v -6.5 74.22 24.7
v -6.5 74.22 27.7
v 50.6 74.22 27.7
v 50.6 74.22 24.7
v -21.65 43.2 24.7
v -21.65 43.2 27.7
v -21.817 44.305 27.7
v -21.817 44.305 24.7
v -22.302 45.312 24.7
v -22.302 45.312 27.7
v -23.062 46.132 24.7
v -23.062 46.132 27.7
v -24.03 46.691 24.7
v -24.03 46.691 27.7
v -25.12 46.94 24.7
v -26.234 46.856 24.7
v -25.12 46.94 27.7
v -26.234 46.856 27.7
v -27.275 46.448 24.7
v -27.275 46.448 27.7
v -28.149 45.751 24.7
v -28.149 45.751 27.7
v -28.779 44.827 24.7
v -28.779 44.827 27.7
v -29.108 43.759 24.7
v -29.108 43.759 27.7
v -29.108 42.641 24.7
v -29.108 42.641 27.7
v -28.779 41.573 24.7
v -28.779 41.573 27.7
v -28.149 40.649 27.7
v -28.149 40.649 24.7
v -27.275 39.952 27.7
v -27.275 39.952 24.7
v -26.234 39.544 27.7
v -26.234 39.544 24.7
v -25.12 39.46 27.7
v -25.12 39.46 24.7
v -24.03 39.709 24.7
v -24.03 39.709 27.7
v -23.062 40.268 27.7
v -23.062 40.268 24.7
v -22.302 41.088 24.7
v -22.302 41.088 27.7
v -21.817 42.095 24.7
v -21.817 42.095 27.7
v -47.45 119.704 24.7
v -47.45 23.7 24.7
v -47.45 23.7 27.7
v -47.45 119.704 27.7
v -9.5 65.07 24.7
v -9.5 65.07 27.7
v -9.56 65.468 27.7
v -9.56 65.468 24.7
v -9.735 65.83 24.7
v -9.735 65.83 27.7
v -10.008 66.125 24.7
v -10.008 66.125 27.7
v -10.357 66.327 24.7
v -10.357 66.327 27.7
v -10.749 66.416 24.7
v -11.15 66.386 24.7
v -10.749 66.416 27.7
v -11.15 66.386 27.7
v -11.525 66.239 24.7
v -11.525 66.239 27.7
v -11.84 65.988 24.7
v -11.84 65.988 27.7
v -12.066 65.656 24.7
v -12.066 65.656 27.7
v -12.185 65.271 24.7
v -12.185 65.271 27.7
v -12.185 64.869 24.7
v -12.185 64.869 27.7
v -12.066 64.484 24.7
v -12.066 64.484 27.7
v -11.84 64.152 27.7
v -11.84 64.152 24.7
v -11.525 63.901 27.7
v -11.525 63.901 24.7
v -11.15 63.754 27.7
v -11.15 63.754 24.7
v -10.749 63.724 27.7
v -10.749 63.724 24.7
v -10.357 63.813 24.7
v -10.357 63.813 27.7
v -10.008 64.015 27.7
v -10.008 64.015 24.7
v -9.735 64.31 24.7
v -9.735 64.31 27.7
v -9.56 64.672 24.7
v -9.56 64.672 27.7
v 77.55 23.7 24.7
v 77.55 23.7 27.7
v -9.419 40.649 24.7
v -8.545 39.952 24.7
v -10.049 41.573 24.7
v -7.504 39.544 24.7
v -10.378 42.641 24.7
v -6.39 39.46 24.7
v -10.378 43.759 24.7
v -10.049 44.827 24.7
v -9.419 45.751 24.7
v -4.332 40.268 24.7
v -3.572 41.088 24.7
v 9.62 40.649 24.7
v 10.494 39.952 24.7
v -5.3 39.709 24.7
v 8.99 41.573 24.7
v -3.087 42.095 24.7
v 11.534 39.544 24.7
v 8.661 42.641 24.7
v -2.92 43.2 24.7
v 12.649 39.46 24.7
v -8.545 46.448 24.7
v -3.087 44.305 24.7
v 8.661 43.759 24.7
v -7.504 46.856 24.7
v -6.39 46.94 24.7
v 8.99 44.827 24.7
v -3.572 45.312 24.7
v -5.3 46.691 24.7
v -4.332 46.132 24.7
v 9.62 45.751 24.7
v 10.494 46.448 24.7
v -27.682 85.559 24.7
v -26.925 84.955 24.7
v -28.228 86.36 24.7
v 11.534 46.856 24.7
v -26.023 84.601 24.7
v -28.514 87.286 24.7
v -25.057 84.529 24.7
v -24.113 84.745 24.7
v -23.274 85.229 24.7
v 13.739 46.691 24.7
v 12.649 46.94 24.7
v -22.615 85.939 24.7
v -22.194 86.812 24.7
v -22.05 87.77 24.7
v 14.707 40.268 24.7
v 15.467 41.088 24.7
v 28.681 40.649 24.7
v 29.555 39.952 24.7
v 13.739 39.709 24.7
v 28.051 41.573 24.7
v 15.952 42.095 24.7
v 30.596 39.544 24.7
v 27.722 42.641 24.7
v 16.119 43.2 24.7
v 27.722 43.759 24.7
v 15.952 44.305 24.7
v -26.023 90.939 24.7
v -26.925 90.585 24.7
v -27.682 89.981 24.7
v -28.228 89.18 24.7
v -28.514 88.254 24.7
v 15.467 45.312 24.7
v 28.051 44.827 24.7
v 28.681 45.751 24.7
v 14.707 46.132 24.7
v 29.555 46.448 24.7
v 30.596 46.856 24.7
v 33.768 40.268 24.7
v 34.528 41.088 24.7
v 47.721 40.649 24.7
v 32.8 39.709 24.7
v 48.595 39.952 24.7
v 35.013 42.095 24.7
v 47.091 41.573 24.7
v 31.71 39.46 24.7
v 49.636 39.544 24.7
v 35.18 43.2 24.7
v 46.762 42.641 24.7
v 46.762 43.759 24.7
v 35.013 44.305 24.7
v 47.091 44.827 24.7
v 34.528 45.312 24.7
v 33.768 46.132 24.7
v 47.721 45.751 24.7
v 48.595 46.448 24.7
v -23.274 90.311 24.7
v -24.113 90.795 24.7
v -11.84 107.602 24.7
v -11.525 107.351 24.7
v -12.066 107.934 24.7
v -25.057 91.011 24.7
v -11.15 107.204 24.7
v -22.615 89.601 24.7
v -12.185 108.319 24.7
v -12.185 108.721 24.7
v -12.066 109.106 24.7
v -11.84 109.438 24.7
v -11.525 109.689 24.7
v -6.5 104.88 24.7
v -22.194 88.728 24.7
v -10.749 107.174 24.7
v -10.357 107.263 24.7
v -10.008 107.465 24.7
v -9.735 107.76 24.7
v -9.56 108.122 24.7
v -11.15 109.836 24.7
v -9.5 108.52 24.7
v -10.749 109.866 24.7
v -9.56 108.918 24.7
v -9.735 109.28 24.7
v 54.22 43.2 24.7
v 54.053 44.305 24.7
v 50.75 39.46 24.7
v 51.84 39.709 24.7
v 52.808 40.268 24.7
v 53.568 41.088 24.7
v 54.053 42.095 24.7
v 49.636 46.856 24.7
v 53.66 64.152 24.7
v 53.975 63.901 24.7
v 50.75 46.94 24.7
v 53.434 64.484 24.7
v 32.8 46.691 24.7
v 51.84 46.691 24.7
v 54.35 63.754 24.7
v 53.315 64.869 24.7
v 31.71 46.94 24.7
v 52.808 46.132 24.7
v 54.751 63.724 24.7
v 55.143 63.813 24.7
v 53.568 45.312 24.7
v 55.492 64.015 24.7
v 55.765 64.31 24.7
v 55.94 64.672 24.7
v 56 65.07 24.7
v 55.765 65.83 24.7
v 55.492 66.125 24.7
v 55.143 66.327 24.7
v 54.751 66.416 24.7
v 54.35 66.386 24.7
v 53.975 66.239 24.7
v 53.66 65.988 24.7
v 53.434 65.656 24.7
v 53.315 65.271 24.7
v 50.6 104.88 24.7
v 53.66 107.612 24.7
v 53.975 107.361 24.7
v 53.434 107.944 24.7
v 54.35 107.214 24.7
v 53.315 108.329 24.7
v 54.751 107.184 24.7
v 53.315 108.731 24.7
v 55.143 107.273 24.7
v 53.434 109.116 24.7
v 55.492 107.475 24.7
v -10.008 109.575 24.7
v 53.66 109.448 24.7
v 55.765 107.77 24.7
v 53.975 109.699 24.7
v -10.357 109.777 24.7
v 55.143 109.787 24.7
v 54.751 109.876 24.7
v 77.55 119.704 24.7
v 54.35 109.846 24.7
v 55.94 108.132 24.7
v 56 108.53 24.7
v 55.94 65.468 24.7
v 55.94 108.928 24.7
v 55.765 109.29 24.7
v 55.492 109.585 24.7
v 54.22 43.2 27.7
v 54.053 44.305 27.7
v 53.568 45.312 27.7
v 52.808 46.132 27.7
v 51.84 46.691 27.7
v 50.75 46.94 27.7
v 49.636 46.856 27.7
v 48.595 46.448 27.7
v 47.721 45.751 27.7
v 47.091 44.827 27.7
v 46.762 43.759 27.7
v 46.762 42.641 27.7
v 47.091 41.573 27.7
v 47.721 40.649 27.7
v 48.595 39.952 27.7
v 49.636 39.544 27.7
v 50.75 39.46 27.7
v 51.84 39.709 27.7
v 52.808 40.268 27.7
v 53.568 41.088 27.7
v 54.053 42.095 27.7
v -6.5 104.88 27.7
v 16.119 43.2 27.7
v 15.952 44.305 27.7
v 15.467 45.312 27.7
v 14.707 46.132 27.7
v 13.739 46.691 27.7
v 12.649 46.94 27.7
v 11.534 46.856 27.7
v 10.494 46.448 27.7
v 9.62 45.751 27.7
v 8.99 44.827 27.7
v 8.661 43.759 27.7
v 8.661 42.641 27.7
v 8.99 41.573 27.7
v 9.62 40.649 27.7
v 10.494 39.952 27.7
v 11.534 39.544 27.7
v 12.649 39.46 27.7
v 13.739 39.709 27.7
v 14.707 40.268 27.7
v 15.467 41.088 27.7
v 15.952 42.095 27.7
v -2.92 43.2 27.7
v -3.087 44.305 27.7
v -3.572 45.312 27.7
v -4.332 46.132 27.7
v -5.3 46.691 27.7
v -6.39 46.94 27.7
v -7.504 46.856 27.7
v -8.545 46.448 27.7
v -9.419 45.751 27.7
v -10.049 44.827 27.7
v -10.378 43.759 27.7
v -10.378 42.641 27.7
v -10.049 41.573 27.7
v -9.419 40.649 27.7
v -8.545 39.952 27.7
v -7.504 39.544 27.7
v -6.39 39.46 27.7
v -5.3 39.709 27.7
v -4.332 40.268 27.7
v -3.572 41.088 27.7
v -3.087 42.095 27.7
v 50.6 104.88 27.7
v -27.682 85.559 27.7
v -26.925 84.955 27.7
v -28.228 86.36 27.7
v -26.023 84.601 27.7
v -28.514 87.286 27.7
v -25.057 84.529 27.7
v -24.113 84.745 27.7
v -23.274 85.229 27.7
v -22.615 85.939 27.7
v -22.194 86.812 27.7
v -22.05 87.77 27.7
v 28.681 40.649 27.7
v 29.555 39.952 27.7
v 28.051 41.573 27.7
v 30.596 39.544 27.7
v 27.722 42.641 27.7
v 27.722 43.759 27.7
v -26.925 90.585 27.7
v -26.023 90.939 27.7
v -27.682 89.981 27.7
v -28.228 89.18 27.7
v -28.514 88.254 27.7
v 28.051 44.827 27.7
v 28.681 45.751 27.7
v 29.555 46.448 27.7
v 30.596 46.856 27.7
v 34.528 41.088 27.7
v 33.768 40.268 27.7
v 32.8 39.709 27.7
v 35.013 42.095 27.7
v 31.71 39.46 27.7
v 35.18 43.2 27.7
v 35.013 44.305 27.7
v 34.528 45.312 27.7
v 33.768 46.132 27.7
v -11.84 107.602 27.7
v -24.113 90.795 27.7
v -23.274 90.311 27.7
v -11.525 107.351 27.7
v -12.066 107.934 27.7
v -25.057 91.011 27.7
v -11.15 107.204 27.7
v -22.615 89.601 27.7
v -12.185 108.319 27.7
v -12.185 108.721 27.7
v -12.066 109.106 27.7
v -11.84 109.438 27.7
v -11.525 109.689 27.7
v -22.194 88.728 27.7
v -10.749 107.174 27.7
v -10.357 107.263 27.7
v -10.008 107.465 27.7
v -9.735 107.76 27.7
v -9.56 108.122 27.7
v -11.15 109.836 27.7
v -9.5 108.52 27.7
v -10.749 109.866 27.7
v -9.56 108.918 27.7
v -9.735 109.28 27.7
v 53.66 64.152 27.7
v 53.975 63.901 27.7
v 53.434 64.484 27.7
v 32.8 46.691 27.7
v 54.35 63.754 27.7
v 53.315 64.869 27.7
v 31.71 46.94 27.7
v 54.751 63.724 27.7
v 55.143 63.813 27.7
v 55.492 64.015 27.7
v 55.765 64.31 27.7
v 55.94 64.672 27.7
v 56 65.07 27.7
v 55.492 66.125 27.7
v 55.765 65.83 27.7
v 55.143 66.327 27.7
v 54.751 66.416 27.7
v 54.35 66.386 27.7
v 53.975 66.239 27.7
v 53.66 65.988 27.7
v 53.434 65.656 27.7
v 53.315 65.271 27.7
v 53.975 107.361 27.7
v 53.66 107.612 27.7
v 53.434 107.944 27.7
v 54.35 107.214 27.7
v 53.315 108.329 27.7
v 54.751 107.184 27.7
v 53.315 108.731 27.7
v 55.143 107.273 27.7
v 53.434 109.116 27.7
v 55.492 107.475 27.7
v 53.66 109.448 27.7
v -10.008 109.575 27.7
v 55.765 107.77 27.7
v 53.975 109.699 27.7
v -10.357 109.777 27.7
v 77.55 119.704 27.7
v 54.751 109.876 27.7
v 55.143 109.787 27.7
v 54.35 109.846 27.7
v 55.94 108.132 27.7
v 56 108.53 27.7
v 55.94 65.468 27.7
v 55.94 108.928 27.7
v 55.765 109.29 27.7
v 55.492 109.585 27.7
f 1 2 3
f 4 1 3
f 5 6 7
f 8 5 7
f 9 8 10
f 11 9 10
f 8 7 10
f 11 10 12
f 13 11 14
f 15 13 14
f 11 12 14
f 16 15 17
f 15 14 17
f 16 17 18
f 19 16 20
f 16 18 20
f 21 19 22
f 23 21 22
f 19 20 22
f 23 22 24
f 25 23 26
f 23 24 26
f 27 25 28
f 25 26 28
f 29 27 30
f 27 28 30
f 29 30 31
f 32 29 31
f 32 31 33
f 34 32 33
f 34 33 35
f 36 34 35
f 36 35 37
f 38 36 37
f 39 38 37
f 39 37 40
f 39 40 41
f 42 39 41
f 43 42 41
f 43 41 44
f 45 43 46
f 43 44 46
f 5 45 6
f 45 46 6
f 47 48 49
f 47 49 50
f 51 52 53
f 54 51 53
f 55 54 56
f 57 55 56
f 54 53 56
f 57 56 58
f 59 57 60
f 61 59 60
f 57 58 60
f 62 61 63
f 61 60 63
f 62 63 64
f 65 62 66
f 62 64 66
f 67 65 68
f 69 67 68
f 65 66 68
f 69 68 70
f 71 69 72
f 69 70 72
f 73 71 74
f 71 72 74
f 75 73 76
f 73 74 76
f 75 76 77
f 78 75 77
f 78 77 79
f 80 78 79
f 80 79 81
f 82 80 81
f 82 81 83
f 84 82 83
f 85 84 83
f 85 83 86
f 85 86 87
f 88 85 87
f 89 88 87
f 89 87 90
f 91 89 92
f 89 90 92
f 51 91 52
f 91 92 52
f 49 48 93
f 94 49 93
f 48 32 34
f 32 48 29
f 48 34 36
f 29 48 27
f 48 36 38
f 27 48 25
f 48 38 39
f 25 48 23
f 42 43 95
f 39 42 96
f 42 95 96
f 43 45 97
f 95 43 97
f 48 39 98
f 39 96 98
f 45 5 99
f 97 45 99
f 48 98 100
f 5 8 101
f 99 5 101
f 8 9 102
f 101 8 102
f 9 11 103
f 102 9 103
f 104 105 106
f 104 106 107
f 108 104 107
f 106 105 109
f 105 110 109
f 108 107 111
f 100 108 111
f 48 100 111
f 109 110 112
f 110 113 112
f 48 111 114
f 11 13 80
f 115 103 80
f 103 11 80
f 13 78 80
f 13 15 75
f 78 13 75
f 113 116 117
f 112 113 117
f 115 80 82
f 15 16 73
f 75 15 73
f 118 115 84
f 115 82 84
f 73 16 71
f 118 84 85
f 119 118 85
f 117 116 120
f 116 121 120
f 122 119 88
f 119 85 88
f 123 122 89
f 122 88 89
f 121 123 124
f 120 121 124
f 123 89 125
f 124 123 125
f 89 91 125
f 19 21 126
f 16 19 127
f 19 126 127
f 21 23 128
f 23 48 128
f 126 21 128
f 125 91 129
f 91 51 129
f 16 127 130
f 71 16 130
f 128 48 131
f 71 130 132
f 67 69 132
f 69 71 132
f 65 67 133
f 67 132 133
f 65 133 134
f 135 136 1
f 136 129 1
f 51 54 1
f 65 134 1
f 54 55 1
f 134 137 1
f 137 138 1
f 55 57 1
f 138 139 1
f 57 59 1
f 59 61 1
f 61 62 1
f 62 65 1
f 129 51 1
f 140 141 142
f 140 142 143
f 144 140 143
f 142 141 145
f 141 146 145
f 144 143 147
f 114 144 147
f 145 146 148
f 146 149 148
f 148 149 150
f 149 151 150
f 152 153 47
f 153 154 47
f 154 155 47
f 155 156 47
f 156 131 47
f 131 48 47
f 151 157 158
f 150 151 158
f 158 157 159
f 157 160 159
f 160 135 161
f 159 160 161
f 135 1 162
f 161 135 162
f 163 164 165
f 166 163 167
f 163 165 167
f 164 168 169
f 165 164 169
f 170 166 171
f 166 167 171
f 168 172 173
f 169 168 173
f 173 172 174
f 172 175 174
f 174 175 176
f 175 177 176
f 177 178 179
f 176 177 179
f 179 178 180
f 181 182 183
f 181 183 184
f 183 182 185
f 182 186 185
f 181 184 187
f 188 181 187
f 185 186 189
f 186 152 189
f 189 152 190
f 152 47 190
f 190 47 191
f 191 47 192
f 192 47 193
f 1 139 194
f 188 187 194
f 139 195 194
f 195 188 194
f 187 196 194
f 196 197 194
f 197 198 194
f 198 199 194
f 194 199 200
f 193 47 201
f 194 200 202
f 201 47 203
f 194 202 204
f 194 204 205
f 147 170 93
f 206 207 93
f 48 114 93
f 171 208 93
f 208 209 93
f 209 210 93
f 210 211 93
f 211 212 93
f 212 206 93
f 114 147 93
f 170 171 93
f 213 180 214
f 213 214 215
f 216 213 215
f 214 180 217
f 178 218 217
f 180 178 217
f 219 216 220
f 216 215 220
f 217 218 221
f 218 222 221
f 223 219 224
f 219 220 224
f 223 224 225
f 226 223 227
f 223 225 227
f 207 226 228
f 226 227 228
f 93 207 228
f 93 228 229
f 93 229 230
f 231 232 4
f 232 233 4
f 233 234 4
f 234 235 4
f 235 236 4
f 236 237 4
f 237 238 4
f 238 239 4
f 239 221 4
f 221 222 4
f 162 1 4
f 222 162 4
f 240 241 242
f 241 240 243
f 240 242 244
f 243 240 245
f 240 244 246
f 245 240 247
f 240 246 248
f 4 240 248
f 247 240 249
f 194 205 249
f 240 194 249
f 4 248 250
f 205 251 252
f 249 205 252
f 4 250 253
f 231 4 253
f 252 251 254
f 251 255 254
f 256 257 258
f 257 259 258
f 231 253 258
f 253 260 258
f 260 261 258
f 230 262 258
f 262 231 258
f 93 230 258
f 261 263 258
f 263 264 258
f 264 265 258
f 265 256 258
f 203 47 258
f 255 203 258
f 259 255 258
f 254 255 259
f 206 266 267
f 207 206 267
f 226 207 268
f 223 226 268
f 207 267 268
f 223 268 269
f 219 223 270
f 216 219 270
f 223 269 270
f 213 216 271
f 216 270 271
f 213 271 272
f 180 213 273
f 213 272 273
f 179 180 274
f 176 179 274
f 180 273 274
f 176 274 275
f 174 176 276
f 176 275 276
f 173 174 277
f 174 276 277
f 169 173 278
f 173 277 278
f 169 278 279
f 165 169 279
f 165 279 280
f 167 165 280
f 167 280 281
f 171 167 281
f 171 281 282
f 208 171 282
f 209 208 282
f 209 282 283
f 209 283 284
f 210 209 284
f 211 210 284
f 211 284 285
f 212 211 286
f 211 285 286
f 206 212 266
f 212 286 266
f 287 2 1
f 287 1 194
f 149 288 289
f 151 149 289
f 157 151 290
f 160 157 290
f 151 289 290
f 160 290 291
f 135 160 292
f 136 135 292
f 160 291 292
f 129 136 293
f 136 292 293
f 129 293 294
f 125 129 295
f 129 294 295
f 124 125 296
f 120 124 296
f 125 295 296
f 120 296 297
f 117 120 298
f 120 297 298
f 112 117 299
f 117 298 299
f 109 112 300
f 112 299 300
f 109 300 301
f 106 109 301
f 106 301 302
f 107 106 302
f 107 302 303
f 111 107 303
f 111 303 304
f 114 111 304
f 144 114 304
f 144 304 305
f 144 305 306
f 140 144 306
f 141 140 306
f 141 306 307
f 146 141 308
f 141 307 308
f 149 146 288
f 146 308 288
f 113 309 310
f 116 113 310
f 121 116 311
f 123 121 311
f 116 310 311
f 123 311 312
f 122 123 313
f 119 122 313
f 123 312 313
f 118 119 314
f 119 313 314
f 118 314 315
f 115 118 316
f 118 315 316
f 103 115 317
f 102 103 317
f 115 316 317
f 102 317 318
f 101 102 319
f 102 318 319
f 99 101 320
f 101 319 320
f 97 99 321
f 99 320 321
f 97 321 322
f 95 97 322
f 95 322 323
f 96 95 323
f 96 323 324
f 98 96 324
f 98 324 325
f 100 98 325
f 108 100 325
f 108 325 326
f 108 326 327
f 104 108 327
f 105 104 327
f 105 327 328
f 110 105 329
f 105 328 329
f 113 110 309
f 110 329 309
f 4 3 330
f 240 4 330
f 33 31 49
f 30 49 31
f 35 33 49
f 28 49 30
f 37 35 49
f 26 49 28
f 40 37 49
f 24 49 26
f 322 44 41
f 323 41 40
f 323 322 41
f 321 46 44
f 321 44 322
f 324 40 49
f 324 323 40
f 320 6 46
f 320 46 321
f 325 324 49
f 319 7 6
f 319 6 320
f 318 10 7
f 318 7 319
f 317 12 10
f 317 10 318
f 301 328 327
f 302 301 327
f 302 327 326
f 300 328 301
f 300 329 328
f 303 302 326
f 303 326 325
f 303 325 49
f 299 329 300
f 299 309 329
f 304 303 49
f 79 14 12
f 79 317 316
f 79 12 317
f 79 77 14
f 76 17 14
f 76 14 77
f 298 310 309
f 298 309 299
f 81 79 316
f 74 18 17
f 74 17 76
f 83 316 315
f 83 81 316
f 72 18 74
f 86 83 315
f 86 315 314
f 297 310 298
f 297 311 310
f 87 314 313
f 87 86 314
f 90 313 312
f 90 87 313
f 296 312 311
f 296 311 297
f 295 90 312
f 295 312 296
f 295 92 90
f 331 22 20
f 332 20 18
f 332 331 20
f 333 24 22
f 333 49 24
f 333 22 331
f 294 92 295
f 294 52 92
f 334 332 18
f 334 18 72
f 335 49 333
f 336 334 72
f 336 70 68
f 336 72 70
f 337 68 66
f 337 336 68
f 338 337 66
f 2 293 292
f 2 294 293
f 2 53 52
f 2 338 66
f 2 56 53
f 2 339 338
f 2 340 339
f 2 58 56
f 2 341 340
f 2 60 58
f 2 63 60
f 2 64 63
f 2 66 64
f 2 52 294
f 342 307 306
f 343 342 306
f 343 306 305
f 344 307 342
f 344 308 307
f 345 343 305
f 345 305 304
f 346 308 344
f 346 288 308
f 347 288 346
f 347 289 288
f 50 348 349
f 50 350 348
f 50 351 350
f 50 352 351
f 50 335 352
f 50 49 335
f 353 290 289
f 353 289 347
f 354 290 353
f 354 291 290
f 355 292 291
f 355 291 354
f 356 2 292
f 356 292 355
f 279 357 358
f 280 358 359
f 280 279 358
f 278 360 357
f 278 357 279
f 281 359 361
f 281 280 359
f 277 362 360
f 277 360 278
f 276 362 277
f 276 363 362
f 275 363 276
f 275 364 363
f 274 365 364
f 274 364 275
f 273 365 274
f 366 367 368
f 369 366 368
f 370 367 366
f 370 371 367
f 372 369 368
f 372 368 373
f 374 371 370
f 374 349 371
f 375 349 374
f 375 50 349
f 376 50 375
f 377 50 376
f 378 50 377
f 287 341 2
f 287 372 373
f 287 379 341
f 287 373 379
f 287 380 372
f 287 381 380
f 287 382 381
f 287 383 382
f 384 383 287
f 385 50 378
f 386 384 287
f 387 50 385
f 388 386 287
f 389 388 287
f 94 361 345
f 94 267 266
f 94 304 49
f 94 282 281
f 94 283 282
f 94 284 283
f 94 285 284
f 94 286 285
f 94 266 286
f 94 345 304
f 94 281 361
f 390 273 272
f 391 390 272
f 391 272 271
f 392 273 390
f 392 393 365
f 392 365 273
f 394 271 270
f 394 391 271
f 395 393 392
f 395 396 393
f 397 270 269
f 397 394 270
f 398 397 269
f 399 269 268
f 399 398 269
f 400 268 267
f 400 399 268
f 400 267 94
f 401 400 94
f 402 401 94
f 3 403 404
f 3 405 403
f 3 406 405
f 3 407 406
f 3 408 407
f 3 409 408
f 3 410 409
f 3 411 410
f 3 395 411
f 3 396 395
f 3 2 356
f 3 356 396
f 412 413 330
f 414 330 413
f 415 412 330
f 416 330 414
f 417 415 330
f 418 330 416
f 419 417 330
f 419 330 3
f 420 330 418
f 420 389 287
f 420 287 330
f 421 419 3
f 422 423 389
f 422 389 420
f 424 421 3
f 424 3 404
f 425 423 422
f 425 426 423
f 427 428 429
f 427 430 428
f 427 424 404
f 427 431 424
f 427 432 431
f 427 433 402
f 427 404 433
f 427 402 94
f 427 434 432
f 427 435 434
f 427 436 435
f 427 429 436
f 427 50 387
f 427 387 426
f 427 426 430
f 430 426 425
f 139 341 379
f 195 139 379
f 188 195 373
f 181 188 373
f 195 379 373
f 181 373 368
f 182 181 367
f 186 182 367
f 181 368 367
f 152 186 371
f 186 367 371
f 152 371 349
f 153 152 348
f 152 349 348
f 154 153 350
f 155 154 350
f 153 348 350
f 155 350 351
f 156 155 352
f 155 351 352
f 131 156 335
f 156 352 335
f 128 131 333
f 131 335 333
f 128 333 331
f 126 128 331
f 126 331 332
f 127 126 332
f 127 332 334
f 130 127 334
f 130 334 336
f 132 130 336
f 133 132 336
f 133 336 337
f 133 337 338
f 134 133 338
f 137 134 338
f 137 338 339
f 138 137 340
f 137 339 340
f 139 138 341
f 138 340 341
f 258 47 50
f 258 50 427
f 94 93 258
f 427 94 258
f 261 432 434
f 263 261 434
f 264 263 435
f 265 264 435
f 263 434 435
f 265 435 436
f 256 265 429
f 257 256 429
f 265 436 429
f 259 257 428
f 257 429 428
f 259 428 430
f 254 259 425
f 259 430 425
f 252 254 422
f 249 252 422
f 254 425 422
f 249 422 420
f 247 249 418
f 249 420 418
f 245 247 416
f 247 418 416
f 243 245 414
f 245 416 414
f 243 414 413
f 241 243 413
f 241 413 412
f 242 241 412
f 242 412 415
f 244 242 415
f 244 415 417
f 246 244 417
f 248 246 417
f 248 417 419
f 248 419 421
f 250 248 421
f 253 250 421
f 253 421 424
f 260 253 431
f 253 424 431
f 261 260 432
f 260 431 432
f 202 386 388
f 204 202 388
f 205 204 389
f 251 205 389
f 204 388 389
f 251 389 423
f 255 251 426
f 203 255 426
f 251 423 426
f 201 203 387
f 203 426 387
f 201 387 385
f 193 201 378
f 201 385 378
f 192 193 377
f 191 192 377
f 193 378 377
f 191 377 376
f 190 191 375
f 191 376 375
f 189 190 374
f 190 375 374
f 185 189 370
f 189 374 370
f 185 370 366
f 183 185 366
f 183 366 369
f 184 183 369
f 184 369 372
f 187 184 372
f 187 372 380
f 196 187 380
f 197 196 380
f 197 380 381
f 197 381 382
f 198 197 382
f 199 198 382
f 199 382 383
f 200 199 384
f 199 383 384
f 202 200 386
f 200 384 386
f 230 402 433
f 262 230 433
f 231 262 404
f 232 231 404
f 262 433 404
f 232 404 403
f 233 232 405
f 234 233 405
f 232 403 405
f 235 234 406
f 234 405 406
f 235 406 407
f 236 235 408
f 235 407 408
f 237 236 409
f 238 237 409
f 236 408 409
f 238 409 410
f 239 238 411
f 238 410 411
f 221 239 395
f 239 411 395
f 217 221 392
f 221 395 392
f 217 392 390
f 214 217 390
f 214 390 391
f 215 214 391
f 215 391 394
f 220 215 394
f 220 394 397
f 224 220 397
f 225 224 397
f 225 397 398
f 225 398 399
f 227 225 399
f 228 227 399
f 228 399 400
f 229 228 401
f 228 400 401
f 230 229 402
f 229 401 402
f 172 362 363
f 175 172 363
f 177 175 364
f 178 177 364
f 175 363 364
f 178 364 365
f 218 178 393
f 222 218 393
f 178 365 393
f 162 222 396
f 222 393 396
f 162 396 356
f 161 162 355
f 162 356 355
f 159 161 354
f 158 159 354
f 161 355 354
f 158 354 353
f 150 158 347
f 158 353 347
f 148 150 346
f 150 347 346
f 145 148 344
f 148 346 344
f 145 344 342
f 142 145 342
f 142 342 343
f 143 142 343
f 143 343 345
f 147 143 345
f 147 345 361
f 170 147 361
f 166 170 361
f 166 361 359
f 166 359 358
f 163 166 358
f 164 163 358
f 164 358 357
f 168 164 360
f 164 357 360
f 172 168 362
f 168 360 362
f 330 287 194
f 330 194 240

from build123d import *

# Parameters (mm, degrees)
SKETCH015_W      = 125.000379
SKETCH015_H      = 96.004006
EXTRUDE013_DEPTH = 3
SKETCH004_R      = 3.75
HOLE001_DEPTH    = 3
SKETCH005_R      = 3.25
HOLE002_DEPTH    = 3
SKETCH007_R      = 3.75
HOLE003_DEPTH    = 3
SKETCH006_R      = 1.35
HOLE004_DEPTH    = 3
SKETCH008_W      = 57.1
SKETCH008_H      = 30.66
POCKET_DEPTH     = 3


with BuildPart() as part:
    # Sketch015 → Extrude013 (new body)
    with BuildSketch(Plane.XY):
        with Locations((15.049815, 71.702003)):
            Rectangle(SKETCH015_W, SKETCH015_H)
    extrude(amount=EXTRUDE013_DEPTH)

    # Sketch004 (on Face6 of Extrude013) → Hole001 (cut)
    with BuildSketch(Plane.XY.offset(3)):
        with Locations((-25.4, 43.200001)):
            Circle(SKETCH004_R)
    extrude(amount=-HOLE001_DEPTH, mode=Mode.SUBTRACT)

    # Sketch005 (on Face5 of Hole001) → Hole002 (cut)
    with BuildSketch(Plane.XY.offset(3)):
        with Locations((-25.299999, 87.769998)):
            Circle(SKETCH005_R)
    extrude(amount=-HOLE002_DEPTH, mode=Mode.SUBTRACT)

    # Sketch007 (on Face5 of Hole002) → Hole003 (cut)
    with BuildSketch(Plane.XY.offset(3)):
        with Locations((-6.67, 43.199999)):
            Circle(SKETCH007_R)
        with Locations((12.368629, 43.200002)):
            Circle(SKETCH007_R)
        with Locations((31.429999, 43.199999)):
            Circle(SKETCH007_R)
        with Locations((50.469999, 43.199999)):
            Circle(SKETCH007_R)
    extrude(amount=-HOLE003_DEPTH, mode=Mode.SUBTRACT)

    # Sketch006 (on Face5 of Hole003) → Hole004 (cut)
    with BuildSketch(Plane.XY.offset(3)):
        with Locations((-10.85, 65.069999)):
            Circle(SKETCH006_R)
        with Locations((54.649999, 65.069999)):
            Circle(SKETCH006_R)
        with Locations((54.649999, 108.529998)):
            Circle(SKETCH006_R)
        with Locations((-10.85, 108.519998)):
            Circle(SKETCH006_R)
    extrude(amount=-HOLE004_DEPTH, mode=Mode.SUBTRACT)

    # Sketch008 (on Face5 of Hole004) → Pocket (cut)
    with BuildSketch(Plane.XY.offset(3)):
        with Locations((22.05, 89.549998)):
            Rectangle(SKETCH008_W, SKETCH008_H)
    extrude(amount=-POCKET_DEPTH, mode=Mode.SUBTRACT)


with BuildPart() as part_1:
    # Body001 placement: moved
    add(part.part.moved(Location((0, 0, 24.7))))


solid = part_1.part
